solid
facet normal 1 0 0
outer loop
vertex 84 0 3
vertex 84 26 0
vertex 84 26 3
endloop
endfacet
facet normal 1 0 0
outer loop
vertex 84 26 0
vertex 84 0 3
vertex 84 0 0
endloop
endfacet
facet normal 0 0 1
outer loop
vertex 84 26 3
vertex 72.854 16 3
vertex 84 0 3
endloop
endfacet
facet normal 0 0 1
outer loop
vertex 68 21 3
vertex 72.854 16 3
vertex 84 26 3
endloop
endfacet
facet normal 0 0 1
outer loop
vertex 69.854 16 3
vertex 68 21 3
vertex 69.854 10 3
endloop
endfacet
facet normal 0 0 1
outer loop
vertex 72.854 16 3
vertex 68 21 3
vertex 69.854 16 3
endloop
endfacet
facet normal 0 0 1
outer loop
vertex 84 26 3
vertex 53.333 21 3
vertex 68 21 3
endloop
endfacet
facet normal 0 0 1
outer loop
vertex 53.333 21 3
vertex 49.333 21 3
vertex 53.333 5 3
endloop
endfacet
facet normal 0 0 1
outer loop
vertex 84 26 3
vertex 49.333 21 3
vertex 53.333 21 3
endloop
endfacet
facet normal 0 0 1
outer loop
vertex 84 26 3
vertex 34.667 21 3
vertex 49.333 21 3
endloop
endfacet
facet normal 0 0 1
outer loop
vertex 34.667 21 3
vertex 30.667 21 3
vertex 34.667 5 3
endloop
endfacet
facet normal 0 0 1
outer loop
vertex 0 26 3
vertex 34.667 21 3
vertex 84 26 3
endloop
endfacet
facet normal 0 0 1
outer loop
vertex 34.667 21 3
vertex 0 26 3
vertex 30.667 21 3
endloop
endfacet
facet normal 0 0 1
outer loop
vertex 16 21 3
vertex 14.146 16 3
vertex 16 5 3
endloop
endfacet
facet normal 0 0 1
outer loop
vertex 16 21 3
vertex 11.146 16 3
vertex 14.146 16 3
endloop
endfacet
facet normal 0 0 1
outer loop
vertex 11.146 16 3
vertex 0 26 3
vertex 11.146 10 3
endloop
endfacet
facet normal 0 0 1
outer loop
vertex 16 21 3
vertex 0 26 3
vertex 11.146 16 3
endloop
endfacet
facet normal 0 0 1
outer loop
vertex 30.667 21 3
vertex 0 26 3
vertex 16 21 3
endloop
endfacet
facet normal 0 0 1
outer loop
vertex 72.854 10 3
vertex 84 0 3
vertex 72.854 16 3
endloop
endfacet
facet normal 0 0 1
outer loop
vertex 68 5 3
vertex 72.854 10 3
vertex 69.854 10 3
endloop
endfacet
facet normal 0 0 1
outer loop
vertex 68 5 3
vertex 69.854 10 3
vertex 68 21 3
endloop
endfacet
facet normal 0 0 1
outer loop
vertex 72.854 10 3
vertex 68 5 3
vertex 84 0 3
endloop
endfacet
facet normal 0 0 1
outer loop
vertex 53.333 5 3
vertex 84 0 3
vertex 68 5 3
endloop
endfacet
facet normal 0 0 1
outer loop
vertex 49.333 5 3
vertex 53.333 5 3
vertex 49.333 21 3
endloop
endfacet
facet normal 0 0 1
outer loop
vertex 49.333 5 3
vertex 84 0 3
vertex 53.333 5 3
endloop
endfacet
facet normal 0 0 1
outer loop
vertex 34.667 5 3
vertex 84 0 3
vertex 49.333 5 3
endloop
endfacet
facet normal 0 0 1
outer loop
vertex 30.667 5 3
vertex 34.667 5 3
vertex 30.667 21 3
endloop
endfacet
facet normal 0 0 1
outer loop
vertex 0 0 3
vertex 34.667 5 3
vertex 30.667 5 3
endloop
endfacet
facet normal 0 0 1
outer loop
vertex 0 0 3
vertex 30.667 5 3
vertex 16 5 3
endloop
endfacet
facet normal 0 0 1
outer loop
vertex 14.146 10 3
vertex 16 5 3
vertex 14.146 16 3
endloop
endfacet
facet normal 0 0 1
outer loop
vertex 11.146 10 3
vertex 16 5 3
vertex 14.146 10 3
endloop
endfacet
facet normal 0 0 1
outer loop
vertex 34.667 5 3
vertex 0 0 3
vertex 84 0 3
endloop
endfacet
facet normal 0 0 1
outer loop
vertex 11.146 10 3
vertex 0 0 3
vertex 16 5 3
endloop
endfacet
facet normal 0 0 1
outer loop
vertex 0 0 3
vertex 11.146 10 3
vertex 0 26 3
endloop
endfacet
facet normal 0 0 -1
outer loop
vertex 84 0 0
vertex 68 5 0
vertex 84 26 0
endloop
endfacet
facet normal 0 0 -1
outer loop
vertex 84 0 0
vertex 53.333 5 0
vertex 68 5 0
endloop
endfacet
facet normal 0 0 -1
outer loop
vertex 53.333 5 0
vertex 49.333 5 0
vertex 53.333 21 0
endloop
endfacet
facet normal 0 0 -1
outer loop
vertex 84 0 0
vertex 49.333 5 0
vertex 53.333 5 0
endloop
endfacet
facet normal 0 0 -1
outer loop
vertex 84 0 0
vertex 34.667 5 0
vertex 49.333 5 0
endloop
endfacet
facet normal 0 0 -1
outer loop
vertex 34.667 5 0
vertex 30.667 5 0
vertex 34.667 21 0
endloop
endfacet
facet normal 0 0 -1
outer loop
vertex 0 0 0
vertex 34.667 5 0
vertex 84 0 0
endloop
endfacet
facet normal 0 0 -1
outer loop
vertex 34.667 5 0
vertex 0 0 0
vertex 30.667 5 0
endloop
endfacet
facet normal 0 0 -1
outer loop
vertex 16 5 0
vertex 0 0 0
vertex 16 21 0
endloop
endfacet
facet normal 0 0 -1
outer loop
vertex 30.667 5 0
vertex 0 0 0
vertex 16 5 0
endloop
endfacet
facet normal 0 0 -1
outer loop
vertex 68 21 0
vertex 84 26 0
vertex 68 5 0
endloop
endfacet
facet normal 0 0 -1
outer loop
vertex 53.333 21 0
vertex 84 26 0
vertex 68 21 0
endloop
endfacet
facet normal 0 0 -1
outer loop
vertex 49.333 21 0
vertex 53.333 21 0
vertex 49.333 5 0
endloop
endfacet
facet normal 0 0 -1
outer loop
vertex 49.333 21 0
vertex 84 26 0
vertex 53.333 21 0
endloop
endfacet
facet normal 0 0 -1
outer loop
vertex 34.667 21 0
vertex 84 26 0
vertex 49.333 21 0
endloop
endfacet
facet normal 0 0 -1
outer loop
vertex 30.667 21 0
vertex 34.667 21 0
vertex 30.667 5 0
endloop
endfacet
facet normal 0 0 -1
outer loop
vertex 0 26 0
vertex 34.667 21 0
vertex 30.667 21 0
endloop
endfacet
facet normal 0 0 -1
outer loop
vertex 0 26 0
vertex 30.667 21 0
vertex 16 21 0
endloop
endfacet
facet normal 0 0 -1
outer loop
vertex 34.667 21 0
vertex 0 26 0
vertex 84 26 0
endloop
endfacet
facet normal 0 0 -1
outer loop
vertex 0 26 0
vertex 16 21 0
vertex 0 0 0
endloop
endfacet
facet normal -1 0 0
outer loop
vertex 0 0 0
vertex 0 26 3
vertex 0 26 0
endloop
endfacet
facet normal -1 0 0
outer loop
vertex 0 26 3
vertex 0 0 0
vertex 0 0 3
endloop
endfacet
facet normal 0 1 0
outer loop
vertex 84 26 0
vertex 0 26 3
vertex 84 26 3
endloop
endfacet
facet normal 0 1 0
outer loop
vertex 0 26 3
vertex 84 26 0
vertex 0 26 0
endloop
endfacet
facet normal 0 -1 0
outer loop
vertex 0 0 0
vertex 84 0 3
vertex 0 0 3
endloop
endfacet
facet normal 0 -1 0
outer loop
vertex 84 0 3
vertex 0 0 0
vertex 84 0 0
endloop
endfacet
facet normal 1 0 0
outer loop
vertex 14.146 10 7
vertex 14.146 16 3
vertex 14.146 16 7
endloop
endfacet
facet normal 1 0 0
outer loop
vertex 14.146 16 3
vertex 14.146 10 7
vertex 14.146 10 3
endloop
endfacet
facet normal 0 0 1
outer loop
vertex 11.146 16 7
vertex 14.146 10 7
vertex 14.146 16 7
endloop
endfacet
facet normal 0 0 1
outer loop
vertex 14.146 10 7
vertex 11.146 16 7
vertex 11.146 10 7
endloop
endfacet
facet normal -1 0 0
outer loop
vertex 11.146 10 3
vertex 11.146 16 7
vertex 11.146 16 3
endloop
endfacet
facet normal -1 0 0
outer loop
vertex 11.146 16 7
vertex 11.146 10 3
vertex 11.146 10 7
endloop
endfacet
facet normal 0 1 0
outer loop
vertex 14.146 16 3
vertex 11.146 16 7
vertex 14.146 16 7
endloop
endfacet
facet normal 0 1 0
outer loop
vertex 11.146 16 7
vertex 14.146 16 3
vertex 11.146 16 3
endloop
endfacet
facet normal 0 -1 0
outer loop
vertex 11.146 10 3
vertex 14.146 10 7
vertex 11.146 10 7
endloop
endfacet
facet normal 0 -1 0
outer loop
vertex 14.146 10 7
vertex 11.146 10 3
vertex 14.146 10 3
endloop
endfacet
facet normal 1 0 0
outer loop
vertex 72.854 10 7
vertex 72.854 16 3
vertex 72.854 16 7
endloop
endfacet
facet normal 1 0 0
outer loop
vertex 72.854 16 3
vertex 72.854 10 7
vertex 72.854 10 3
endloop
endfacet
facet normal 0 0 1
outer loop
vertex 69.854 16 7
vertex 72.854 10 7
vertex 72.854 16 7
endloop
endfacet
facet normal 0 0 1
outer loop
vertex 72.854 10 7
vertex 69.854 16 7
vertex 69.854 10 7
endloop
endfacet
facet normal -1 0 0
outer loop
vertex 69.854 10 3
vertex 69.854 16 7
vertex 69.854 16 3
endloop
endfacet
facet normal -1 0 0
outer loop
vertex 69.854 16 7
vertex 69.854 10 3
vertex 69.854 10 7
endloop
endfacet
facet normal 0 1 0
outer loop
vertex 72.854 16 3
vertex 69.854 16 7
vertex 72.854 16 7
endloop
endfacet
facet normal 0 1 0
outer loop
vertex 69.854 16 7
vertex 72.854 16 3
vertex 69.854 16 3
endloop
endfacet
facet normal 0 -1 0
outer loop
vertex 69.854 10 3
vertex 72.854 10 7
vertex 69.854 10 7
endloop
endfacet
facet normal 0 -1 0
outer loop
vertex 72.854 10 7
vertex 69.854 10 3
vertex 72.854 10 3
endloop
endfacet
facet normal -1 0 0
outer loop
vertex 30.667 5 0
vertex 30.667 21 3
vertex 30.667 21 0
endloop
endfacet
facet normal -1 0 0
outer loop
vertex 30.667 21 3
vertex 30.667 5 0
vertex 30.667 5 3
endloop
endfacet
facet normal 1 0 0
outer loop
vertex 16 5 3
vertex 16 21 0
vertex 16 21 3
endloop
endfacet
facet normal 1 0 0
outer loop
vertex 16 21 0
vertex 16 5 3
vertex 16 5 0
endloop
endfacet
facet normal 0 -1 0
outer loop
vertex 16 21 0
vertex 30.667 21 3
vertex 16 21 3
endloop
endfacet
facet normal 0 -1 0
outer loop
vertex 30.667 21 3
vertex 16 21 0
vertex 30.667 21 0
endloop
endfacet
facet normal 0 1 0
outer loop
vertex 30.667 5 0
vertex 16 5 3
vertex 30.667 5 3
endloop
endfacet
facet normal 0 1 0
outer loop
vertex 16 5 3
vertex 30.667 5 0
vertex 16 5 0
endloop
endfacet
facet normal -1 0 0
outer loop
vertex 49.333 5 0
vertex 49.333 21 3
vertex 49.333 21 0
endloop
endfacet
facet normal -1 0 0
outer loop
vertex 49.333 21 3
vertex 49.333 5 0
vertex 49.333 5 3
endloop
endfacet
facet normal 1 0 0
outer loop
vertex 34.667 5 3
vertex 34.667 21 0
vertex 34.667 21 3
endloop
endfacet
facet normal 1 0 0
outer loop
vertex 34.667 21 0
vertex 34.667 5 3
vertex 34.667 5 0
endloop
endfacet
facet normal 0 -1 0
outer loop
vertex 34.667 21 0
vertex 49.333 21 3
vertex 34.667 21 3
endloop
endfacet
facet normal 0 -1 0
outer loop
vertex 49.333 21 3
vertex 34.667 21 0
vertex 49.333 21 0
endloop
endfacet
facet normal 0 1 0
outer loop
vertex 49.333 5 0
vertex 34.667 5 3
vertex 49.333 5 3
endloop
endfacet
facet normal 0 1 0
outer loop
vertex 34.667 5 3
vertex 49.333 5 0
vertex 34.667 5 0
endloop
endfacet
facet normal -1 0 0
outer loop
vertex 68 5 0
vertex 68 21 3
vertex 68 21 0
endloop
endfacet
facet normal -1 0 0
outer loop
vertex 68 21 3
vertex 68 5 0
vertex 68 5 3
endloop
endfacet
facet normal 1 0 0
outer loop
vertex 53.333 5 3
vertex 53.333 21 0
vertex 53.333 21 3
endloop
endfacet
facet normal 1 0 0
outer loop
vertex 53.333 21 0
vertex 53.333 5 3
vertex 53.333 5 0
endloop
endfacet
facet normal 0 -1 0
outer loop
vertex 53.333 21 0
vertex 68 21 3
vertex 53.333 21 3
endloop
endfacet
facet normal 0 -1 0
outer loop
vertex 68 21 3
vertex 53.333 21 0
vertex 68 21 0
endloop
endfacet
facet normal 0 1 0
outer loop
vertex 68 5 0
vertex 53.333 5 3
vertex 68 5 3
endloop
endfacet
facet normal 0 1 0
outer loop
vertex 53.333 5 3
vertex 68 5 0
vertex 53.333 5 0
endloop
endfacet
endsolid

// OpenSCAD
// Root Ladder / all dimensions mm / print tabs upward, then flip onto jar
$fn=48;
difference(){
 union(){
  cube([84,26,3]);
  translate([11.145502758916976,10,3]) cube([3,6,4]);
  translate([69.85449724108302,10,3]) cube([3,6,4]);
 }
 translate([16,5,-1]) cube([14.666666666666664,16,5]);
 translate([34.666666666666664,5,-1]) cube([14.666666666666664,16,5]);
 translate([53.33333333333333,5,-1]) cube([14.666666666666671,16,5]);
}
